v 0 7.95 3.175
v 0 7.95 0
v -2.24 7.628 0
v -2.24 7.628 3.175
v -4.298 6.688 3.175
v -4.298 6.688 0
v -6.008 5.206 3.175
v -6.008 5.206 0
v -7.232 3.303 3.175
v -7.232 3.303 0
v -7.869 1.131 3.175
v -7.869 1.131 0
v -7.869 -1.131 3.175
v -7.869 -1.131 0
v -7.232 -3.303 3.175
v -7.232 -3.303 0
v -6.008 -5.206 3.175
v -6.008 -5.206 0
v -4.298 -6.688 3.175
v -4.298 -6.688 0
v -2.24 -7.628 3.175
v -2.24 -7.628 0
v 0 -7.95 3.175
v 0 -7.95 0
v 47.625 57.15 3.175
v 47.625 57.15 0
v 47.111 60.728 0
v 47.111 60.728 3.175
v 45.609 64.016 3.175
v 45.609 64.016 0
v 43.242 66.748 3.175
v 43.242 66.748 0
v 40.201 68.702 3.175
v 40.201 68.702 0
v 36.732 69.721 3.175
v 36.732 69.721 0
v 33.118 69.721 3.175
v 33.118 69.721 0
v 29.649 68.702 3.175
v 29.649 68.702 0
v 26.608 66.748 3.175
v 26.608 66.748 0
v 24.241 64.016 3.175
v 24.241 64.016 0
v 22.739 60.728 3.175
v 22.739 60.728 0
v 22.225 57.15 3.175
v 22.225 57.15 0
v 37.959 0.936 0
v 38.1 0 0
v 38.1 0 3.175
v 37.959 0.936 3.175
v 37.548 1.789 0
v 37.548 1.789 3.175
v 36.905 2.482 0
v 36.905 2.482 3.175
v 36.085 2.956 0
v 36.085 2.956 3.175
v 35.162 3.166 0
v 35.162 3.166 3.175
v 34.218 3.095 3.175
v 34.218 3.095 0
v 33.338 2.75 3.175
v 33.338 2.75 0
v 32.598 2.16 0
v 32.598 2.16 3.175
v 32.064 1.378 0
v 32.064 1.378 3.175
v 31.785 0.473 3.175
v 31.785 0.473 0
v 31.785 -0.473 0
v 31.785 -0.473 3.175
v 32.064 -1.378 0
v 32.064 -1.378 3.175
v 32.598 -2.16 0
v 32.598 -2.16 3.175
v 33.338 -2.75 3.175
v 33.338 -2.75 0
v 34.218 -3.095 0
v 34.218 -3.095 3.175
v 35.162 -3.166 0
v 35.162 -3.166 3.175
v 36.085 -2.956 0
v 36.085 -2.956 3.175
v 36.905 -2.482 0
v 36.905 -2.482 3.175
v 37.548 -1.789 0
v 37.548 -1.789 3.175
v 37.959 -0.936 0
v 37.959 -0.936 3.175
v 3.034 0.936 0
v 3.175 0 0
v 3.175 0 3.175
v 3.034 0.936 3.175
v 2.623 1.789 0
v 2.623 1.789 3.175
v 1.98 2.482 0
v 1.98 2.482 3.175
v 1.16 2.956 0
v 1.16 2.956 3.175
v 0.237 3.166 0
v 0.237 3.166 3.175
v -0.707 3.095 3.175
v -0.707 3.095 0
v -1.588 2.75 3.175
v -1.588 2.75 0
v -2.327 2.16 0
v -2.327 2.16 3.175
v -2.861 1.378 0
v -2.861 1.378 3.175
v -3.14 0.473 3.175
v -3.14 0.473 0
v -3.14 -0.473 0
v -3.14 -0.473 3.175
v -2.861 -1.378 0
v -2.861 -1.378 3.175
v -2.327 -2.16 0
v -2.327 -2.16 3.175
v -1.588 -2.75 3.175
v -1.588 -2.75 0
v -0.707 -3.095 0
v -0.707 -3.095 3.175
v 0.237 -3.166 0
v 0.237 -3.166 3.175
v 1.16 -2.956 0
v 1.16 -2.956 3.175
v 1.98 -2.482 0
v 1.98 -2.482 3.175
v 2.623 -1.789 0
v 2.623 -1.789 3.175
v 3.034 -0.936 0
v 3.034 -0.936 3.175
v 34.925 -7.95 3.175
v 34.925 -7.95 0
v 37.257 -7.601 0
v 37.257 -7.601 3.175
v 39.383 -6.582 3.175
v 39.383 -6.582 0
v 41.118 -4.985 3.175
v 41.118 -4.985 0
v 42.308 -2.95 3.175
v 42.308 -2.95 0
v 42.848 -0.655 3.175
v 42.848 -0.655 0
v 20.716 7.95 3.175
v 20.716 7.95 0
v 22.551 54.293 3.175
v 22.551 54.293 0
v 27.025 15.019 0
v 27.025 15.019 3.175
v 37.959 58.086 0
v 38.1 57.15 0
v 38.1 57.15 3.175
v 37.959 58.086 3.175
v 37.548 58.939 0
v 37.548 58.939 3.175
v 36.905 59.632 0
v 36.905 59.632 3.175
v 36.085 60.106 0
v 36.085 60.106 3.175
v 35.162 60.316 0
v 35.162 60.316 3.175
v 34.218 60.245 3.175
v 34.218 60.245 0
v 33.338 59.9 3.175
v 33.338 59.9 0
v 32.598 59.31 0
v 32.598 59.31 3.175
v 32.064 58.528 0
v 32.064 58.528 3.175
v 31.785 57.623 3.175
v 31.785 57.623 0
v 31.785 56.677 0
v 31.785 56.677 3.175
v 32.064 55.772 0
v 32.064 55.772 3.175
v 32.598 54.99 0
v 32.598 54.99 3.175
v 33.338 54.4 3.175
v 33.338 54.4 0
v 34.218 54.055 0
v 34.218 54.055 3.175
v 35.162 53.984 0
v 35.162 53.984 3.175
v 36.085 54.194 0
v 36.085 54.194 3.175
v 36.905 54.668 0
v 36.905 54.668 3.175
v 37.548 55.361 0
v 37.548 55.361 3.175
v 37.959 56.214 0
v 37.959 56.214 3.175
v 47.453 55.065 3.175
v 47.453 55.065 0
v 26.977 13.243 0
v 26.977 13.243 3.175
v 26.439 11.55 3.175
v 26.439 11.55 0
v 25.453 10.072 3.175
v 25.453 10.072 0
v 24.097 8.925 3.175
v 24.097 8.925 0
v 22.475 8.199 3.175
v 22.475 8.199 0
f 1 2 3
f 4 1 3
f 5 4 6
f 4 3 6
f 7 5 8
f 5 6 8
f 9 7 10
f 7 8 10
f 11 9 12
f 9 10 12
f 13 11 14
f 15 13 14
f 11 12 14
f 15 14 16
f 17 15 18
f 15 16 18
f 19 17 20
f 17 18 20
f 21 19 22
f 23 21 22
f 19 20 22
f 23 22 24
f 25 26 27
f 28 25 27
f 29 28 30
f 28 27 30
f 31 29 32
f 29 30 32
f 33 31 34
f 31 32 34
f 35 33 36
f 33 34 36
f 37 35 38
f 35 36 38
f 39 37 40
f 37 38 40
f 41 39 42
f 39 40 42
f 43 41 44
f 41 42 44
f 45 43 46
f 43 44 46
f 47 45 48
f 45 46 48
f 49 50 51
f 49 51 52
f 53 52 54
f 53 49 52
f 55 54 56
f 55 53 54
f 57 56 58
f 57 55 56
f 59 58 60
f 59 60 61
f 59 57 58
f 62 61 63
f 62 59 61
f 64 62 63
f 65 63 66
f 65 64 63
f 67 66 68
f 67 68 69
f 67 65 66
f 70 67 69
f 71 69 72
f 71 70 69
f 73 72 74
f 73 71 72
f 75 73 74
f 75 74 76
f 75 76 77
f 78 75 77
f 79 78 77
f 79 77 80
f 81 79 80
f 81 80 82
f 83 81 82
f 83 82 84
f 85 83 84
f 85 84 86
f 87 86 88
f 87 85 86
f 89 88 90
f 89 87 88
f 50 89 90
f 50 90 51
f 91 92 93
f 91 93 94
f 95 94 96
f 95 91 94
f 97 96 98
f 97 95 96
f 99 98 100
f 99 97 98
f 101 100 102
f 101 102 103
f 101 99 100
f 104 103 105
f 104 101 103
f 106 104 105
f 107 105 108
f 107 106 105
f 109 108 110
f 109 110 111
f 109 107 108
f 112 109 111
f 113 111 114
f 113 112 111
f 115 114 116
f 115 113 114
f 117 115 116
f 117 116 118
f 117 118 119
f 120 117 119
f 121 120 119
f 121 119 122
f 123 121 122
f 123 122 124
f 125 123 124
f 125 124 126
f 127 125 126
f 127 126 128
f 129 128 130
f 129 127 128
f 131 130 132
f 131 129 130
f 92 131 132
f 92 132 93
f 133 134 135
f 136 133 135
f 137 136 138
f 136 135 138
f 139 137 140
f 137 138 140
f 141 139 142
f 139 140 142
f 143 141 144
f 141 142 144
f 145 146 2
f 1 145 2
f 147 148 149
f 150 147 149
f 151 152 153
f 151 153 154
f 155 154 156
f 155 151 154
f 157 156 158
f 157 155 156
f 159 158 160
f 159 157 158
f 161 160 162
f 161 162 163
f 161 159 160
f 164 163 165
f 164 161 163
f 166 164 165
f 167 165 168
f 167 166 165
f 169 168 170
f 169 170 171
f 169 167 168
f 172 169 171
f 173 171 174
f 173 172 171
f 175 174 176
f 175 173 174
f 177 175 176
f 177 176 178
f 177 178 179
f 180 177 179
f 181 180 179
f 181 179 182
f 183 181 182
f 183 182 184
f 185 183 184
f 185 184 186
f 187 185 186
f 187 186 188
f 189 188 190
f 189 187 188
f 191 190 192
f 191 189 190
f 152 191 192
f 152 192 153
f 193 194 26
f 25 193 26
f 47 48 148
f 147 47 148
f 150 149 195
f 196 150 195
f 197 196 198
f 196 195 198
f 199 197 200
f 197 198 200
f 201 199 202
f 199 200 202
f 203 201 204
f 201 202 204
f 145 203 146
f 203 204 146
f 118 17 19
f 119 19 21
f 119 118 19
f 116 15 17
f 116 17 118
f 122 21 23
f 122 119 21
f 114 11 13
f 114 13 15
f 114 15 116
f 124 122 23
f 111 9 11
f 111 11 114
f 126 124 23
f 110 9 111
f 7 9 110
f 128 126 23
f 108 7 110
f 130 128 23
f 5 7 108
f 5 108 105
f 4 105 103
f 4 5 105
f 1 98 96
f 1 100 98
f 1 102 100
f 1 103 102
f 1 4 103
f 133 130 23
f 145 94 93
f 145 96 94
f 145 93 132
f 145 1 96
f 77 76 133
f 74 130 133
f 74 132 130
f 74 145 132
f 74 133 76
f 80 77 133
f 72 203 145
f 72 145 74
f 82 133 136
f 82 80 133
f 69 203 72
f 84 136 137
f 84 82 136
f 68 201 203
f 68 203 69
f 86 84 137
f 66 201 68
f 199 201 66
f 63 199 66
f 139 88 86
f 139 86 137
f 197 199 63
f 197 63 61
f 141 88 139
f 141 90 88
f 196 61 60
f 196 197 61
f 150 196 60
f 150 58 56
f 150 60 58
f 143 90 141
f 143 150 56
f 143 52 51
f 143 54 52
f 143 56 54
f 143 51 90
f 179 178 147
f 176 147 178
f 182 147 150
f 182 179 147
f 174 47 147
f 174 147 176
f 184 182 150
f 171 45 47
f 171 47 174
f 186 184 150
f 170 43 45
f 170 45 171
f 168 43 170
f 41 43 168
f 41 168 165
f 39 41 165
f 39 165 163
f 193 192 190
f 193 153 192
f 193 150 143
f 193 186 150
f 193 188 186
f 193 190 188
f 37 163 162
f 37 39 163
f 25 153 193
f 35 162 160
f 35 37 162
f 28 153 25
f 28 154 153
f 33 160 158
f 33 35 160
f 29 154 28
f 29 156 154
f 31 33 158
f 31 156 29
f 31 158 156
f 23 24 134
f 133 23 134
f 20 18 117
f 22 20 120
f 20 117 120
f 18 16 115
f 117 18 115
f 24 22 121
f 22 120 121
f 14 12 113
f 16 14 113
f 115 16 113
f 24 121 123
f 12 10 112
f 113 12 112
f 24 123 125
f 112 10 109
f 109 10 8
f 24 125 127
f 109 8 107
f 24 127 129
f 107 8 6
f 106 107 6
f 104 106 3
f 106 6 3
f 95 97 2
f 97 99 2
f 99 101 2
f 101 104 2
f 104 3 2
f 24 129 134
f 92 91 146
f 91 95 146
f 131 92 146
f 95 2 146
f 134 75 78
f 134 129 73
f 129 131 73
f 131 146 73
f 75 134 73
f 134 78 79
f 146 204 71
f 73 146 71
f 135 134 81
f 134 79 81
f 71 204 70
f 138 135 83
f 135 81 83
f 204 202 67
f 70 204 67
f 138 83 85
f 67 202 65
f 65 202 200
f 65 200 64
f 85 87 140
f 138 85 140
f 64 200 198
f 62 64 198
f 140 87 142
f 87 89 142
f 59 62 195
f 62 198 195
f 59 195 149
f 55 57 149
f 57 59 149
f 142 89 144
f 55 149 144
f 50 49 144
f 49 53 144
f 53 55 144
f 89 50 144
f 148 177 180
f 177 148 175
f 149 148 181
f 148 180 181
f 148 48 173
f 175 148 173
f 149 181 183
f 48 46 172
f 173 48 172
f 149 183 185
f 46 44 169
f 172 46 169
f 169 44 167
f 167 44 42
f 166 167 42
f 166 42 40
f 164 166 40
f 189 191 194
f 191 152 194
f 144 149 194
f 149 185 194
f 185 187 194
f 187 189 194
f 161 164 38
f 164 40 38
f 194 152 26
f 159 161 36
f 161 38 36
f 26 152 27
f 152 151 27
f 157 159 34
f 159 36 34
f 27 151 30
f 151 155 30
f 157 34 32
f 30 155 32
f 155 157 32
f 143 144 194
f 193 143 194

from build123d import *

# Parameters (mm, degrees)
SKETCH1_R           = 3.175
BOSS_EXTRUDE1_DEPTH = 3.175


with BuildPart() as part:
    # Sketch1 → Boss-Extrude1 (new body)
    with BuildSketch(Plane.XY):
        with BuildLine():
            Line((20.716035226, 7.9502), (0, 7.9502))
            ThreePointArc((0, 7.9502), (-7.9502, 0), (0, -7.9502))
            Line((0, -7.9502), (34.925, -7.9502))
            ThreePointArc((34.925, -7.9502), (40.310178716, -5.848549413), (42.84819283, -0.654748362))
            Line((42.84819283, -0.654748362), (47.452723337, 55.065258294))
            Line((47.452723337, 55.065258294), (47.625, 57.15))
            ThreePointArc((47.625, 57.15), (34.925, 69.85), (22.225, 57.15))
            Line((22.225, 57.15), (22.550500177, 54.29312161))
            Line((22.550500177, 54.29312161), (27.02521651, 15.019040407))
            ThreePointArc((27.02521651, 15.019040407), (25.453499558, 10.071851421), (20.716035226, 7.9502))
        make_face()
        Circle(SKETCH1_R, mode=Mode.SUBTRACT)
        with Locations((34.925, 0)):
            Circle(SKETCH1_R, mode=Mode.SUBTRACT)
        with Locations((34.925, 57.15)):
            Circle(SKETCH1_R, mode=Mode.SUBTRACT)
    extrude(amount=BOSS_EXTRUDE1_DEPTH)


solid = part.part
